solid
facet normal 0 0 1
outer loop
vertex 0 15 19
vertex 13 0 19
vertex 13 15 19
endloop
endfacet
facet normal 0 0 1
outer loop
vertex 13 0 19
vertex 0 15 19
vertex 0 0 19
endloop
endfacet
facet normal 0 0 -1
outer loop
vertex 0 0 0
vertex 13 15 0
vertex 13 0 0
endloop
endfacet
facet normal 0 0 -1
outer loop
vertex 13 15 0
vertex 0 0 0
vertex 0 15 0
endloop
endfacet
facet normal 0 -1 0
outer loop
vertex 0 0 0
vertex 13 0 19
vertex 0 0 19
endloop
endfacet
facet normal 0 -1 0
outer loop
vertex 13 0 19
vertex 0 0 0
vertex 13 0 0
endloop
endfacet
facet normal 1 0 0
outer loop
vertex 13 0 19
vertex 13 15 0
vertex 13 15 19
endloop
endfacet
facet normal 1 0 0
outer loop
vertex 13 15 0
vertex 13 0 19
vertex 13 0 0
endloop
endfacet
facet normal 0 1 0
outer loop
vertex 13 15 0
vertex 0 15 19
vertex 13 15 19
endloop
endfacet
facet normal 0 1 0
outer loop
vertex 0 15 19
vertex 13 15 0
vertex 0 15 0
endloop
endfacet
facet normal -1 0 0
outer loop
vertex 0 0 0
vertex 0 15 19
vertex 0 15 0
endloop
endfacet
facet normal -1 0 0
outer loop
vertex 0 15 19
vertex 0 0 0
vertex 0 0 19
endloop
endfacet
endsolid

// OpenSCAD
// Generated by SolidPython 1.0.1 on 2020-07-29 00:46:55


cube(size = [13, 15, 19]);
/***********************************************
*********      SolidPython code:      **********
************************************************
 
# import packages: SolidPython
from solid import *
from solid.utils import *
from itertools import chain, combinations, permutations


class Resize:

    def __init__(self, scad_file):
        self.scad_file = scad_file
        #self.scad_file = import_scad(scad_file)
        # cone/cylinder param:
        self.r1 = 0
        self.r2 = 0
        self.h = 0
        # rectangular prism param:
        self.w = 0
        self.l = 0
        # ellipse param:
        self.r = 0

    # import OpenScad code (file name corresponds to shape)


    # classify shape + parameters
    def assign(self, param1, param2, param3):
        if self.scad_file == 'cone.scad':
            self.r1 = param1
            self.r2 = param2
            self.h = param3
        elif self.scad_file == 'cylinder.scad':
            self.r1 = param1
            self.r2 = param2
            self.h = param3
        elif self.scad_file == 'rectangularPrism.scad':
            self.h = param1
            self.l = param2
            self.w = param3
        else:
            self.r = param1
            self.h = param2

    # resize parameters
    def iterate(self):
        x = range(3, 20, 2)
        i = 1
        if self.scad_file == 'cone.scad':
            tempList = list(permutations(x, 2))
            for temp in tempList:
                param1 = temp[0]
                param2 = temp[1]
                filepath = 'produced_scad_files/' + 'cone' + str(param1) + '_' + str(param2) + '_' + '.scad'
                scad_render_to_file(cylinder(h=param1, r1=param2, r2=0), filepath)

        elif self.scad_file == 'cylinder.scad':
            tempList = list(permutations(x, 3))
            for temp in tempList:
                param1 = temp[0]
                param2 = temp[1]
                filepath = 'produced_scad_files/' + 'cylinder' + str(param1) + '_' + str(param2) + '_' + '.scad'
                scad_render_to_file(cylinder(h=param1, r1=param2, r2=param2), filepath)

        elif self.scad_file == 'rectangularPrism.scad':
            tempList = list(permutations(x, 3))
            for temp in tempList:
                param1 = temp[0]
                param2 = temp[1]
                param3 = temp[2]
                filepath = 'produced_scad_files/' + 'rectangularPrism' + str(param1) + '_' + str(param2) + '_' + str(
                    param3) + '.scad'
                scad_render_to_file(cube(size=(param1, param2, param3)), filepath)

        elif self.scad_file == 'ellipse.scad':
            tempList = list(permutations(x, 4))
            for temp in tempList:
                param1 = temp[0]
                param2 = temp[1]
                param3 = temp[2]
                param4 = temp[3]
                filepath = 'produced_scad_files/' + 'ellipse' + str(param1) + '_' + str(param2) + '_' + str(param3) + '_' + str(param4) + '.scad'
                scad_render_to_file(scale([param1, param2, param3])(sphere(r=param4)), filepath)

    def render_to_scadfile(self):
        scad_render_to_file(scad, 'example.scad') 
 
************************************************/
